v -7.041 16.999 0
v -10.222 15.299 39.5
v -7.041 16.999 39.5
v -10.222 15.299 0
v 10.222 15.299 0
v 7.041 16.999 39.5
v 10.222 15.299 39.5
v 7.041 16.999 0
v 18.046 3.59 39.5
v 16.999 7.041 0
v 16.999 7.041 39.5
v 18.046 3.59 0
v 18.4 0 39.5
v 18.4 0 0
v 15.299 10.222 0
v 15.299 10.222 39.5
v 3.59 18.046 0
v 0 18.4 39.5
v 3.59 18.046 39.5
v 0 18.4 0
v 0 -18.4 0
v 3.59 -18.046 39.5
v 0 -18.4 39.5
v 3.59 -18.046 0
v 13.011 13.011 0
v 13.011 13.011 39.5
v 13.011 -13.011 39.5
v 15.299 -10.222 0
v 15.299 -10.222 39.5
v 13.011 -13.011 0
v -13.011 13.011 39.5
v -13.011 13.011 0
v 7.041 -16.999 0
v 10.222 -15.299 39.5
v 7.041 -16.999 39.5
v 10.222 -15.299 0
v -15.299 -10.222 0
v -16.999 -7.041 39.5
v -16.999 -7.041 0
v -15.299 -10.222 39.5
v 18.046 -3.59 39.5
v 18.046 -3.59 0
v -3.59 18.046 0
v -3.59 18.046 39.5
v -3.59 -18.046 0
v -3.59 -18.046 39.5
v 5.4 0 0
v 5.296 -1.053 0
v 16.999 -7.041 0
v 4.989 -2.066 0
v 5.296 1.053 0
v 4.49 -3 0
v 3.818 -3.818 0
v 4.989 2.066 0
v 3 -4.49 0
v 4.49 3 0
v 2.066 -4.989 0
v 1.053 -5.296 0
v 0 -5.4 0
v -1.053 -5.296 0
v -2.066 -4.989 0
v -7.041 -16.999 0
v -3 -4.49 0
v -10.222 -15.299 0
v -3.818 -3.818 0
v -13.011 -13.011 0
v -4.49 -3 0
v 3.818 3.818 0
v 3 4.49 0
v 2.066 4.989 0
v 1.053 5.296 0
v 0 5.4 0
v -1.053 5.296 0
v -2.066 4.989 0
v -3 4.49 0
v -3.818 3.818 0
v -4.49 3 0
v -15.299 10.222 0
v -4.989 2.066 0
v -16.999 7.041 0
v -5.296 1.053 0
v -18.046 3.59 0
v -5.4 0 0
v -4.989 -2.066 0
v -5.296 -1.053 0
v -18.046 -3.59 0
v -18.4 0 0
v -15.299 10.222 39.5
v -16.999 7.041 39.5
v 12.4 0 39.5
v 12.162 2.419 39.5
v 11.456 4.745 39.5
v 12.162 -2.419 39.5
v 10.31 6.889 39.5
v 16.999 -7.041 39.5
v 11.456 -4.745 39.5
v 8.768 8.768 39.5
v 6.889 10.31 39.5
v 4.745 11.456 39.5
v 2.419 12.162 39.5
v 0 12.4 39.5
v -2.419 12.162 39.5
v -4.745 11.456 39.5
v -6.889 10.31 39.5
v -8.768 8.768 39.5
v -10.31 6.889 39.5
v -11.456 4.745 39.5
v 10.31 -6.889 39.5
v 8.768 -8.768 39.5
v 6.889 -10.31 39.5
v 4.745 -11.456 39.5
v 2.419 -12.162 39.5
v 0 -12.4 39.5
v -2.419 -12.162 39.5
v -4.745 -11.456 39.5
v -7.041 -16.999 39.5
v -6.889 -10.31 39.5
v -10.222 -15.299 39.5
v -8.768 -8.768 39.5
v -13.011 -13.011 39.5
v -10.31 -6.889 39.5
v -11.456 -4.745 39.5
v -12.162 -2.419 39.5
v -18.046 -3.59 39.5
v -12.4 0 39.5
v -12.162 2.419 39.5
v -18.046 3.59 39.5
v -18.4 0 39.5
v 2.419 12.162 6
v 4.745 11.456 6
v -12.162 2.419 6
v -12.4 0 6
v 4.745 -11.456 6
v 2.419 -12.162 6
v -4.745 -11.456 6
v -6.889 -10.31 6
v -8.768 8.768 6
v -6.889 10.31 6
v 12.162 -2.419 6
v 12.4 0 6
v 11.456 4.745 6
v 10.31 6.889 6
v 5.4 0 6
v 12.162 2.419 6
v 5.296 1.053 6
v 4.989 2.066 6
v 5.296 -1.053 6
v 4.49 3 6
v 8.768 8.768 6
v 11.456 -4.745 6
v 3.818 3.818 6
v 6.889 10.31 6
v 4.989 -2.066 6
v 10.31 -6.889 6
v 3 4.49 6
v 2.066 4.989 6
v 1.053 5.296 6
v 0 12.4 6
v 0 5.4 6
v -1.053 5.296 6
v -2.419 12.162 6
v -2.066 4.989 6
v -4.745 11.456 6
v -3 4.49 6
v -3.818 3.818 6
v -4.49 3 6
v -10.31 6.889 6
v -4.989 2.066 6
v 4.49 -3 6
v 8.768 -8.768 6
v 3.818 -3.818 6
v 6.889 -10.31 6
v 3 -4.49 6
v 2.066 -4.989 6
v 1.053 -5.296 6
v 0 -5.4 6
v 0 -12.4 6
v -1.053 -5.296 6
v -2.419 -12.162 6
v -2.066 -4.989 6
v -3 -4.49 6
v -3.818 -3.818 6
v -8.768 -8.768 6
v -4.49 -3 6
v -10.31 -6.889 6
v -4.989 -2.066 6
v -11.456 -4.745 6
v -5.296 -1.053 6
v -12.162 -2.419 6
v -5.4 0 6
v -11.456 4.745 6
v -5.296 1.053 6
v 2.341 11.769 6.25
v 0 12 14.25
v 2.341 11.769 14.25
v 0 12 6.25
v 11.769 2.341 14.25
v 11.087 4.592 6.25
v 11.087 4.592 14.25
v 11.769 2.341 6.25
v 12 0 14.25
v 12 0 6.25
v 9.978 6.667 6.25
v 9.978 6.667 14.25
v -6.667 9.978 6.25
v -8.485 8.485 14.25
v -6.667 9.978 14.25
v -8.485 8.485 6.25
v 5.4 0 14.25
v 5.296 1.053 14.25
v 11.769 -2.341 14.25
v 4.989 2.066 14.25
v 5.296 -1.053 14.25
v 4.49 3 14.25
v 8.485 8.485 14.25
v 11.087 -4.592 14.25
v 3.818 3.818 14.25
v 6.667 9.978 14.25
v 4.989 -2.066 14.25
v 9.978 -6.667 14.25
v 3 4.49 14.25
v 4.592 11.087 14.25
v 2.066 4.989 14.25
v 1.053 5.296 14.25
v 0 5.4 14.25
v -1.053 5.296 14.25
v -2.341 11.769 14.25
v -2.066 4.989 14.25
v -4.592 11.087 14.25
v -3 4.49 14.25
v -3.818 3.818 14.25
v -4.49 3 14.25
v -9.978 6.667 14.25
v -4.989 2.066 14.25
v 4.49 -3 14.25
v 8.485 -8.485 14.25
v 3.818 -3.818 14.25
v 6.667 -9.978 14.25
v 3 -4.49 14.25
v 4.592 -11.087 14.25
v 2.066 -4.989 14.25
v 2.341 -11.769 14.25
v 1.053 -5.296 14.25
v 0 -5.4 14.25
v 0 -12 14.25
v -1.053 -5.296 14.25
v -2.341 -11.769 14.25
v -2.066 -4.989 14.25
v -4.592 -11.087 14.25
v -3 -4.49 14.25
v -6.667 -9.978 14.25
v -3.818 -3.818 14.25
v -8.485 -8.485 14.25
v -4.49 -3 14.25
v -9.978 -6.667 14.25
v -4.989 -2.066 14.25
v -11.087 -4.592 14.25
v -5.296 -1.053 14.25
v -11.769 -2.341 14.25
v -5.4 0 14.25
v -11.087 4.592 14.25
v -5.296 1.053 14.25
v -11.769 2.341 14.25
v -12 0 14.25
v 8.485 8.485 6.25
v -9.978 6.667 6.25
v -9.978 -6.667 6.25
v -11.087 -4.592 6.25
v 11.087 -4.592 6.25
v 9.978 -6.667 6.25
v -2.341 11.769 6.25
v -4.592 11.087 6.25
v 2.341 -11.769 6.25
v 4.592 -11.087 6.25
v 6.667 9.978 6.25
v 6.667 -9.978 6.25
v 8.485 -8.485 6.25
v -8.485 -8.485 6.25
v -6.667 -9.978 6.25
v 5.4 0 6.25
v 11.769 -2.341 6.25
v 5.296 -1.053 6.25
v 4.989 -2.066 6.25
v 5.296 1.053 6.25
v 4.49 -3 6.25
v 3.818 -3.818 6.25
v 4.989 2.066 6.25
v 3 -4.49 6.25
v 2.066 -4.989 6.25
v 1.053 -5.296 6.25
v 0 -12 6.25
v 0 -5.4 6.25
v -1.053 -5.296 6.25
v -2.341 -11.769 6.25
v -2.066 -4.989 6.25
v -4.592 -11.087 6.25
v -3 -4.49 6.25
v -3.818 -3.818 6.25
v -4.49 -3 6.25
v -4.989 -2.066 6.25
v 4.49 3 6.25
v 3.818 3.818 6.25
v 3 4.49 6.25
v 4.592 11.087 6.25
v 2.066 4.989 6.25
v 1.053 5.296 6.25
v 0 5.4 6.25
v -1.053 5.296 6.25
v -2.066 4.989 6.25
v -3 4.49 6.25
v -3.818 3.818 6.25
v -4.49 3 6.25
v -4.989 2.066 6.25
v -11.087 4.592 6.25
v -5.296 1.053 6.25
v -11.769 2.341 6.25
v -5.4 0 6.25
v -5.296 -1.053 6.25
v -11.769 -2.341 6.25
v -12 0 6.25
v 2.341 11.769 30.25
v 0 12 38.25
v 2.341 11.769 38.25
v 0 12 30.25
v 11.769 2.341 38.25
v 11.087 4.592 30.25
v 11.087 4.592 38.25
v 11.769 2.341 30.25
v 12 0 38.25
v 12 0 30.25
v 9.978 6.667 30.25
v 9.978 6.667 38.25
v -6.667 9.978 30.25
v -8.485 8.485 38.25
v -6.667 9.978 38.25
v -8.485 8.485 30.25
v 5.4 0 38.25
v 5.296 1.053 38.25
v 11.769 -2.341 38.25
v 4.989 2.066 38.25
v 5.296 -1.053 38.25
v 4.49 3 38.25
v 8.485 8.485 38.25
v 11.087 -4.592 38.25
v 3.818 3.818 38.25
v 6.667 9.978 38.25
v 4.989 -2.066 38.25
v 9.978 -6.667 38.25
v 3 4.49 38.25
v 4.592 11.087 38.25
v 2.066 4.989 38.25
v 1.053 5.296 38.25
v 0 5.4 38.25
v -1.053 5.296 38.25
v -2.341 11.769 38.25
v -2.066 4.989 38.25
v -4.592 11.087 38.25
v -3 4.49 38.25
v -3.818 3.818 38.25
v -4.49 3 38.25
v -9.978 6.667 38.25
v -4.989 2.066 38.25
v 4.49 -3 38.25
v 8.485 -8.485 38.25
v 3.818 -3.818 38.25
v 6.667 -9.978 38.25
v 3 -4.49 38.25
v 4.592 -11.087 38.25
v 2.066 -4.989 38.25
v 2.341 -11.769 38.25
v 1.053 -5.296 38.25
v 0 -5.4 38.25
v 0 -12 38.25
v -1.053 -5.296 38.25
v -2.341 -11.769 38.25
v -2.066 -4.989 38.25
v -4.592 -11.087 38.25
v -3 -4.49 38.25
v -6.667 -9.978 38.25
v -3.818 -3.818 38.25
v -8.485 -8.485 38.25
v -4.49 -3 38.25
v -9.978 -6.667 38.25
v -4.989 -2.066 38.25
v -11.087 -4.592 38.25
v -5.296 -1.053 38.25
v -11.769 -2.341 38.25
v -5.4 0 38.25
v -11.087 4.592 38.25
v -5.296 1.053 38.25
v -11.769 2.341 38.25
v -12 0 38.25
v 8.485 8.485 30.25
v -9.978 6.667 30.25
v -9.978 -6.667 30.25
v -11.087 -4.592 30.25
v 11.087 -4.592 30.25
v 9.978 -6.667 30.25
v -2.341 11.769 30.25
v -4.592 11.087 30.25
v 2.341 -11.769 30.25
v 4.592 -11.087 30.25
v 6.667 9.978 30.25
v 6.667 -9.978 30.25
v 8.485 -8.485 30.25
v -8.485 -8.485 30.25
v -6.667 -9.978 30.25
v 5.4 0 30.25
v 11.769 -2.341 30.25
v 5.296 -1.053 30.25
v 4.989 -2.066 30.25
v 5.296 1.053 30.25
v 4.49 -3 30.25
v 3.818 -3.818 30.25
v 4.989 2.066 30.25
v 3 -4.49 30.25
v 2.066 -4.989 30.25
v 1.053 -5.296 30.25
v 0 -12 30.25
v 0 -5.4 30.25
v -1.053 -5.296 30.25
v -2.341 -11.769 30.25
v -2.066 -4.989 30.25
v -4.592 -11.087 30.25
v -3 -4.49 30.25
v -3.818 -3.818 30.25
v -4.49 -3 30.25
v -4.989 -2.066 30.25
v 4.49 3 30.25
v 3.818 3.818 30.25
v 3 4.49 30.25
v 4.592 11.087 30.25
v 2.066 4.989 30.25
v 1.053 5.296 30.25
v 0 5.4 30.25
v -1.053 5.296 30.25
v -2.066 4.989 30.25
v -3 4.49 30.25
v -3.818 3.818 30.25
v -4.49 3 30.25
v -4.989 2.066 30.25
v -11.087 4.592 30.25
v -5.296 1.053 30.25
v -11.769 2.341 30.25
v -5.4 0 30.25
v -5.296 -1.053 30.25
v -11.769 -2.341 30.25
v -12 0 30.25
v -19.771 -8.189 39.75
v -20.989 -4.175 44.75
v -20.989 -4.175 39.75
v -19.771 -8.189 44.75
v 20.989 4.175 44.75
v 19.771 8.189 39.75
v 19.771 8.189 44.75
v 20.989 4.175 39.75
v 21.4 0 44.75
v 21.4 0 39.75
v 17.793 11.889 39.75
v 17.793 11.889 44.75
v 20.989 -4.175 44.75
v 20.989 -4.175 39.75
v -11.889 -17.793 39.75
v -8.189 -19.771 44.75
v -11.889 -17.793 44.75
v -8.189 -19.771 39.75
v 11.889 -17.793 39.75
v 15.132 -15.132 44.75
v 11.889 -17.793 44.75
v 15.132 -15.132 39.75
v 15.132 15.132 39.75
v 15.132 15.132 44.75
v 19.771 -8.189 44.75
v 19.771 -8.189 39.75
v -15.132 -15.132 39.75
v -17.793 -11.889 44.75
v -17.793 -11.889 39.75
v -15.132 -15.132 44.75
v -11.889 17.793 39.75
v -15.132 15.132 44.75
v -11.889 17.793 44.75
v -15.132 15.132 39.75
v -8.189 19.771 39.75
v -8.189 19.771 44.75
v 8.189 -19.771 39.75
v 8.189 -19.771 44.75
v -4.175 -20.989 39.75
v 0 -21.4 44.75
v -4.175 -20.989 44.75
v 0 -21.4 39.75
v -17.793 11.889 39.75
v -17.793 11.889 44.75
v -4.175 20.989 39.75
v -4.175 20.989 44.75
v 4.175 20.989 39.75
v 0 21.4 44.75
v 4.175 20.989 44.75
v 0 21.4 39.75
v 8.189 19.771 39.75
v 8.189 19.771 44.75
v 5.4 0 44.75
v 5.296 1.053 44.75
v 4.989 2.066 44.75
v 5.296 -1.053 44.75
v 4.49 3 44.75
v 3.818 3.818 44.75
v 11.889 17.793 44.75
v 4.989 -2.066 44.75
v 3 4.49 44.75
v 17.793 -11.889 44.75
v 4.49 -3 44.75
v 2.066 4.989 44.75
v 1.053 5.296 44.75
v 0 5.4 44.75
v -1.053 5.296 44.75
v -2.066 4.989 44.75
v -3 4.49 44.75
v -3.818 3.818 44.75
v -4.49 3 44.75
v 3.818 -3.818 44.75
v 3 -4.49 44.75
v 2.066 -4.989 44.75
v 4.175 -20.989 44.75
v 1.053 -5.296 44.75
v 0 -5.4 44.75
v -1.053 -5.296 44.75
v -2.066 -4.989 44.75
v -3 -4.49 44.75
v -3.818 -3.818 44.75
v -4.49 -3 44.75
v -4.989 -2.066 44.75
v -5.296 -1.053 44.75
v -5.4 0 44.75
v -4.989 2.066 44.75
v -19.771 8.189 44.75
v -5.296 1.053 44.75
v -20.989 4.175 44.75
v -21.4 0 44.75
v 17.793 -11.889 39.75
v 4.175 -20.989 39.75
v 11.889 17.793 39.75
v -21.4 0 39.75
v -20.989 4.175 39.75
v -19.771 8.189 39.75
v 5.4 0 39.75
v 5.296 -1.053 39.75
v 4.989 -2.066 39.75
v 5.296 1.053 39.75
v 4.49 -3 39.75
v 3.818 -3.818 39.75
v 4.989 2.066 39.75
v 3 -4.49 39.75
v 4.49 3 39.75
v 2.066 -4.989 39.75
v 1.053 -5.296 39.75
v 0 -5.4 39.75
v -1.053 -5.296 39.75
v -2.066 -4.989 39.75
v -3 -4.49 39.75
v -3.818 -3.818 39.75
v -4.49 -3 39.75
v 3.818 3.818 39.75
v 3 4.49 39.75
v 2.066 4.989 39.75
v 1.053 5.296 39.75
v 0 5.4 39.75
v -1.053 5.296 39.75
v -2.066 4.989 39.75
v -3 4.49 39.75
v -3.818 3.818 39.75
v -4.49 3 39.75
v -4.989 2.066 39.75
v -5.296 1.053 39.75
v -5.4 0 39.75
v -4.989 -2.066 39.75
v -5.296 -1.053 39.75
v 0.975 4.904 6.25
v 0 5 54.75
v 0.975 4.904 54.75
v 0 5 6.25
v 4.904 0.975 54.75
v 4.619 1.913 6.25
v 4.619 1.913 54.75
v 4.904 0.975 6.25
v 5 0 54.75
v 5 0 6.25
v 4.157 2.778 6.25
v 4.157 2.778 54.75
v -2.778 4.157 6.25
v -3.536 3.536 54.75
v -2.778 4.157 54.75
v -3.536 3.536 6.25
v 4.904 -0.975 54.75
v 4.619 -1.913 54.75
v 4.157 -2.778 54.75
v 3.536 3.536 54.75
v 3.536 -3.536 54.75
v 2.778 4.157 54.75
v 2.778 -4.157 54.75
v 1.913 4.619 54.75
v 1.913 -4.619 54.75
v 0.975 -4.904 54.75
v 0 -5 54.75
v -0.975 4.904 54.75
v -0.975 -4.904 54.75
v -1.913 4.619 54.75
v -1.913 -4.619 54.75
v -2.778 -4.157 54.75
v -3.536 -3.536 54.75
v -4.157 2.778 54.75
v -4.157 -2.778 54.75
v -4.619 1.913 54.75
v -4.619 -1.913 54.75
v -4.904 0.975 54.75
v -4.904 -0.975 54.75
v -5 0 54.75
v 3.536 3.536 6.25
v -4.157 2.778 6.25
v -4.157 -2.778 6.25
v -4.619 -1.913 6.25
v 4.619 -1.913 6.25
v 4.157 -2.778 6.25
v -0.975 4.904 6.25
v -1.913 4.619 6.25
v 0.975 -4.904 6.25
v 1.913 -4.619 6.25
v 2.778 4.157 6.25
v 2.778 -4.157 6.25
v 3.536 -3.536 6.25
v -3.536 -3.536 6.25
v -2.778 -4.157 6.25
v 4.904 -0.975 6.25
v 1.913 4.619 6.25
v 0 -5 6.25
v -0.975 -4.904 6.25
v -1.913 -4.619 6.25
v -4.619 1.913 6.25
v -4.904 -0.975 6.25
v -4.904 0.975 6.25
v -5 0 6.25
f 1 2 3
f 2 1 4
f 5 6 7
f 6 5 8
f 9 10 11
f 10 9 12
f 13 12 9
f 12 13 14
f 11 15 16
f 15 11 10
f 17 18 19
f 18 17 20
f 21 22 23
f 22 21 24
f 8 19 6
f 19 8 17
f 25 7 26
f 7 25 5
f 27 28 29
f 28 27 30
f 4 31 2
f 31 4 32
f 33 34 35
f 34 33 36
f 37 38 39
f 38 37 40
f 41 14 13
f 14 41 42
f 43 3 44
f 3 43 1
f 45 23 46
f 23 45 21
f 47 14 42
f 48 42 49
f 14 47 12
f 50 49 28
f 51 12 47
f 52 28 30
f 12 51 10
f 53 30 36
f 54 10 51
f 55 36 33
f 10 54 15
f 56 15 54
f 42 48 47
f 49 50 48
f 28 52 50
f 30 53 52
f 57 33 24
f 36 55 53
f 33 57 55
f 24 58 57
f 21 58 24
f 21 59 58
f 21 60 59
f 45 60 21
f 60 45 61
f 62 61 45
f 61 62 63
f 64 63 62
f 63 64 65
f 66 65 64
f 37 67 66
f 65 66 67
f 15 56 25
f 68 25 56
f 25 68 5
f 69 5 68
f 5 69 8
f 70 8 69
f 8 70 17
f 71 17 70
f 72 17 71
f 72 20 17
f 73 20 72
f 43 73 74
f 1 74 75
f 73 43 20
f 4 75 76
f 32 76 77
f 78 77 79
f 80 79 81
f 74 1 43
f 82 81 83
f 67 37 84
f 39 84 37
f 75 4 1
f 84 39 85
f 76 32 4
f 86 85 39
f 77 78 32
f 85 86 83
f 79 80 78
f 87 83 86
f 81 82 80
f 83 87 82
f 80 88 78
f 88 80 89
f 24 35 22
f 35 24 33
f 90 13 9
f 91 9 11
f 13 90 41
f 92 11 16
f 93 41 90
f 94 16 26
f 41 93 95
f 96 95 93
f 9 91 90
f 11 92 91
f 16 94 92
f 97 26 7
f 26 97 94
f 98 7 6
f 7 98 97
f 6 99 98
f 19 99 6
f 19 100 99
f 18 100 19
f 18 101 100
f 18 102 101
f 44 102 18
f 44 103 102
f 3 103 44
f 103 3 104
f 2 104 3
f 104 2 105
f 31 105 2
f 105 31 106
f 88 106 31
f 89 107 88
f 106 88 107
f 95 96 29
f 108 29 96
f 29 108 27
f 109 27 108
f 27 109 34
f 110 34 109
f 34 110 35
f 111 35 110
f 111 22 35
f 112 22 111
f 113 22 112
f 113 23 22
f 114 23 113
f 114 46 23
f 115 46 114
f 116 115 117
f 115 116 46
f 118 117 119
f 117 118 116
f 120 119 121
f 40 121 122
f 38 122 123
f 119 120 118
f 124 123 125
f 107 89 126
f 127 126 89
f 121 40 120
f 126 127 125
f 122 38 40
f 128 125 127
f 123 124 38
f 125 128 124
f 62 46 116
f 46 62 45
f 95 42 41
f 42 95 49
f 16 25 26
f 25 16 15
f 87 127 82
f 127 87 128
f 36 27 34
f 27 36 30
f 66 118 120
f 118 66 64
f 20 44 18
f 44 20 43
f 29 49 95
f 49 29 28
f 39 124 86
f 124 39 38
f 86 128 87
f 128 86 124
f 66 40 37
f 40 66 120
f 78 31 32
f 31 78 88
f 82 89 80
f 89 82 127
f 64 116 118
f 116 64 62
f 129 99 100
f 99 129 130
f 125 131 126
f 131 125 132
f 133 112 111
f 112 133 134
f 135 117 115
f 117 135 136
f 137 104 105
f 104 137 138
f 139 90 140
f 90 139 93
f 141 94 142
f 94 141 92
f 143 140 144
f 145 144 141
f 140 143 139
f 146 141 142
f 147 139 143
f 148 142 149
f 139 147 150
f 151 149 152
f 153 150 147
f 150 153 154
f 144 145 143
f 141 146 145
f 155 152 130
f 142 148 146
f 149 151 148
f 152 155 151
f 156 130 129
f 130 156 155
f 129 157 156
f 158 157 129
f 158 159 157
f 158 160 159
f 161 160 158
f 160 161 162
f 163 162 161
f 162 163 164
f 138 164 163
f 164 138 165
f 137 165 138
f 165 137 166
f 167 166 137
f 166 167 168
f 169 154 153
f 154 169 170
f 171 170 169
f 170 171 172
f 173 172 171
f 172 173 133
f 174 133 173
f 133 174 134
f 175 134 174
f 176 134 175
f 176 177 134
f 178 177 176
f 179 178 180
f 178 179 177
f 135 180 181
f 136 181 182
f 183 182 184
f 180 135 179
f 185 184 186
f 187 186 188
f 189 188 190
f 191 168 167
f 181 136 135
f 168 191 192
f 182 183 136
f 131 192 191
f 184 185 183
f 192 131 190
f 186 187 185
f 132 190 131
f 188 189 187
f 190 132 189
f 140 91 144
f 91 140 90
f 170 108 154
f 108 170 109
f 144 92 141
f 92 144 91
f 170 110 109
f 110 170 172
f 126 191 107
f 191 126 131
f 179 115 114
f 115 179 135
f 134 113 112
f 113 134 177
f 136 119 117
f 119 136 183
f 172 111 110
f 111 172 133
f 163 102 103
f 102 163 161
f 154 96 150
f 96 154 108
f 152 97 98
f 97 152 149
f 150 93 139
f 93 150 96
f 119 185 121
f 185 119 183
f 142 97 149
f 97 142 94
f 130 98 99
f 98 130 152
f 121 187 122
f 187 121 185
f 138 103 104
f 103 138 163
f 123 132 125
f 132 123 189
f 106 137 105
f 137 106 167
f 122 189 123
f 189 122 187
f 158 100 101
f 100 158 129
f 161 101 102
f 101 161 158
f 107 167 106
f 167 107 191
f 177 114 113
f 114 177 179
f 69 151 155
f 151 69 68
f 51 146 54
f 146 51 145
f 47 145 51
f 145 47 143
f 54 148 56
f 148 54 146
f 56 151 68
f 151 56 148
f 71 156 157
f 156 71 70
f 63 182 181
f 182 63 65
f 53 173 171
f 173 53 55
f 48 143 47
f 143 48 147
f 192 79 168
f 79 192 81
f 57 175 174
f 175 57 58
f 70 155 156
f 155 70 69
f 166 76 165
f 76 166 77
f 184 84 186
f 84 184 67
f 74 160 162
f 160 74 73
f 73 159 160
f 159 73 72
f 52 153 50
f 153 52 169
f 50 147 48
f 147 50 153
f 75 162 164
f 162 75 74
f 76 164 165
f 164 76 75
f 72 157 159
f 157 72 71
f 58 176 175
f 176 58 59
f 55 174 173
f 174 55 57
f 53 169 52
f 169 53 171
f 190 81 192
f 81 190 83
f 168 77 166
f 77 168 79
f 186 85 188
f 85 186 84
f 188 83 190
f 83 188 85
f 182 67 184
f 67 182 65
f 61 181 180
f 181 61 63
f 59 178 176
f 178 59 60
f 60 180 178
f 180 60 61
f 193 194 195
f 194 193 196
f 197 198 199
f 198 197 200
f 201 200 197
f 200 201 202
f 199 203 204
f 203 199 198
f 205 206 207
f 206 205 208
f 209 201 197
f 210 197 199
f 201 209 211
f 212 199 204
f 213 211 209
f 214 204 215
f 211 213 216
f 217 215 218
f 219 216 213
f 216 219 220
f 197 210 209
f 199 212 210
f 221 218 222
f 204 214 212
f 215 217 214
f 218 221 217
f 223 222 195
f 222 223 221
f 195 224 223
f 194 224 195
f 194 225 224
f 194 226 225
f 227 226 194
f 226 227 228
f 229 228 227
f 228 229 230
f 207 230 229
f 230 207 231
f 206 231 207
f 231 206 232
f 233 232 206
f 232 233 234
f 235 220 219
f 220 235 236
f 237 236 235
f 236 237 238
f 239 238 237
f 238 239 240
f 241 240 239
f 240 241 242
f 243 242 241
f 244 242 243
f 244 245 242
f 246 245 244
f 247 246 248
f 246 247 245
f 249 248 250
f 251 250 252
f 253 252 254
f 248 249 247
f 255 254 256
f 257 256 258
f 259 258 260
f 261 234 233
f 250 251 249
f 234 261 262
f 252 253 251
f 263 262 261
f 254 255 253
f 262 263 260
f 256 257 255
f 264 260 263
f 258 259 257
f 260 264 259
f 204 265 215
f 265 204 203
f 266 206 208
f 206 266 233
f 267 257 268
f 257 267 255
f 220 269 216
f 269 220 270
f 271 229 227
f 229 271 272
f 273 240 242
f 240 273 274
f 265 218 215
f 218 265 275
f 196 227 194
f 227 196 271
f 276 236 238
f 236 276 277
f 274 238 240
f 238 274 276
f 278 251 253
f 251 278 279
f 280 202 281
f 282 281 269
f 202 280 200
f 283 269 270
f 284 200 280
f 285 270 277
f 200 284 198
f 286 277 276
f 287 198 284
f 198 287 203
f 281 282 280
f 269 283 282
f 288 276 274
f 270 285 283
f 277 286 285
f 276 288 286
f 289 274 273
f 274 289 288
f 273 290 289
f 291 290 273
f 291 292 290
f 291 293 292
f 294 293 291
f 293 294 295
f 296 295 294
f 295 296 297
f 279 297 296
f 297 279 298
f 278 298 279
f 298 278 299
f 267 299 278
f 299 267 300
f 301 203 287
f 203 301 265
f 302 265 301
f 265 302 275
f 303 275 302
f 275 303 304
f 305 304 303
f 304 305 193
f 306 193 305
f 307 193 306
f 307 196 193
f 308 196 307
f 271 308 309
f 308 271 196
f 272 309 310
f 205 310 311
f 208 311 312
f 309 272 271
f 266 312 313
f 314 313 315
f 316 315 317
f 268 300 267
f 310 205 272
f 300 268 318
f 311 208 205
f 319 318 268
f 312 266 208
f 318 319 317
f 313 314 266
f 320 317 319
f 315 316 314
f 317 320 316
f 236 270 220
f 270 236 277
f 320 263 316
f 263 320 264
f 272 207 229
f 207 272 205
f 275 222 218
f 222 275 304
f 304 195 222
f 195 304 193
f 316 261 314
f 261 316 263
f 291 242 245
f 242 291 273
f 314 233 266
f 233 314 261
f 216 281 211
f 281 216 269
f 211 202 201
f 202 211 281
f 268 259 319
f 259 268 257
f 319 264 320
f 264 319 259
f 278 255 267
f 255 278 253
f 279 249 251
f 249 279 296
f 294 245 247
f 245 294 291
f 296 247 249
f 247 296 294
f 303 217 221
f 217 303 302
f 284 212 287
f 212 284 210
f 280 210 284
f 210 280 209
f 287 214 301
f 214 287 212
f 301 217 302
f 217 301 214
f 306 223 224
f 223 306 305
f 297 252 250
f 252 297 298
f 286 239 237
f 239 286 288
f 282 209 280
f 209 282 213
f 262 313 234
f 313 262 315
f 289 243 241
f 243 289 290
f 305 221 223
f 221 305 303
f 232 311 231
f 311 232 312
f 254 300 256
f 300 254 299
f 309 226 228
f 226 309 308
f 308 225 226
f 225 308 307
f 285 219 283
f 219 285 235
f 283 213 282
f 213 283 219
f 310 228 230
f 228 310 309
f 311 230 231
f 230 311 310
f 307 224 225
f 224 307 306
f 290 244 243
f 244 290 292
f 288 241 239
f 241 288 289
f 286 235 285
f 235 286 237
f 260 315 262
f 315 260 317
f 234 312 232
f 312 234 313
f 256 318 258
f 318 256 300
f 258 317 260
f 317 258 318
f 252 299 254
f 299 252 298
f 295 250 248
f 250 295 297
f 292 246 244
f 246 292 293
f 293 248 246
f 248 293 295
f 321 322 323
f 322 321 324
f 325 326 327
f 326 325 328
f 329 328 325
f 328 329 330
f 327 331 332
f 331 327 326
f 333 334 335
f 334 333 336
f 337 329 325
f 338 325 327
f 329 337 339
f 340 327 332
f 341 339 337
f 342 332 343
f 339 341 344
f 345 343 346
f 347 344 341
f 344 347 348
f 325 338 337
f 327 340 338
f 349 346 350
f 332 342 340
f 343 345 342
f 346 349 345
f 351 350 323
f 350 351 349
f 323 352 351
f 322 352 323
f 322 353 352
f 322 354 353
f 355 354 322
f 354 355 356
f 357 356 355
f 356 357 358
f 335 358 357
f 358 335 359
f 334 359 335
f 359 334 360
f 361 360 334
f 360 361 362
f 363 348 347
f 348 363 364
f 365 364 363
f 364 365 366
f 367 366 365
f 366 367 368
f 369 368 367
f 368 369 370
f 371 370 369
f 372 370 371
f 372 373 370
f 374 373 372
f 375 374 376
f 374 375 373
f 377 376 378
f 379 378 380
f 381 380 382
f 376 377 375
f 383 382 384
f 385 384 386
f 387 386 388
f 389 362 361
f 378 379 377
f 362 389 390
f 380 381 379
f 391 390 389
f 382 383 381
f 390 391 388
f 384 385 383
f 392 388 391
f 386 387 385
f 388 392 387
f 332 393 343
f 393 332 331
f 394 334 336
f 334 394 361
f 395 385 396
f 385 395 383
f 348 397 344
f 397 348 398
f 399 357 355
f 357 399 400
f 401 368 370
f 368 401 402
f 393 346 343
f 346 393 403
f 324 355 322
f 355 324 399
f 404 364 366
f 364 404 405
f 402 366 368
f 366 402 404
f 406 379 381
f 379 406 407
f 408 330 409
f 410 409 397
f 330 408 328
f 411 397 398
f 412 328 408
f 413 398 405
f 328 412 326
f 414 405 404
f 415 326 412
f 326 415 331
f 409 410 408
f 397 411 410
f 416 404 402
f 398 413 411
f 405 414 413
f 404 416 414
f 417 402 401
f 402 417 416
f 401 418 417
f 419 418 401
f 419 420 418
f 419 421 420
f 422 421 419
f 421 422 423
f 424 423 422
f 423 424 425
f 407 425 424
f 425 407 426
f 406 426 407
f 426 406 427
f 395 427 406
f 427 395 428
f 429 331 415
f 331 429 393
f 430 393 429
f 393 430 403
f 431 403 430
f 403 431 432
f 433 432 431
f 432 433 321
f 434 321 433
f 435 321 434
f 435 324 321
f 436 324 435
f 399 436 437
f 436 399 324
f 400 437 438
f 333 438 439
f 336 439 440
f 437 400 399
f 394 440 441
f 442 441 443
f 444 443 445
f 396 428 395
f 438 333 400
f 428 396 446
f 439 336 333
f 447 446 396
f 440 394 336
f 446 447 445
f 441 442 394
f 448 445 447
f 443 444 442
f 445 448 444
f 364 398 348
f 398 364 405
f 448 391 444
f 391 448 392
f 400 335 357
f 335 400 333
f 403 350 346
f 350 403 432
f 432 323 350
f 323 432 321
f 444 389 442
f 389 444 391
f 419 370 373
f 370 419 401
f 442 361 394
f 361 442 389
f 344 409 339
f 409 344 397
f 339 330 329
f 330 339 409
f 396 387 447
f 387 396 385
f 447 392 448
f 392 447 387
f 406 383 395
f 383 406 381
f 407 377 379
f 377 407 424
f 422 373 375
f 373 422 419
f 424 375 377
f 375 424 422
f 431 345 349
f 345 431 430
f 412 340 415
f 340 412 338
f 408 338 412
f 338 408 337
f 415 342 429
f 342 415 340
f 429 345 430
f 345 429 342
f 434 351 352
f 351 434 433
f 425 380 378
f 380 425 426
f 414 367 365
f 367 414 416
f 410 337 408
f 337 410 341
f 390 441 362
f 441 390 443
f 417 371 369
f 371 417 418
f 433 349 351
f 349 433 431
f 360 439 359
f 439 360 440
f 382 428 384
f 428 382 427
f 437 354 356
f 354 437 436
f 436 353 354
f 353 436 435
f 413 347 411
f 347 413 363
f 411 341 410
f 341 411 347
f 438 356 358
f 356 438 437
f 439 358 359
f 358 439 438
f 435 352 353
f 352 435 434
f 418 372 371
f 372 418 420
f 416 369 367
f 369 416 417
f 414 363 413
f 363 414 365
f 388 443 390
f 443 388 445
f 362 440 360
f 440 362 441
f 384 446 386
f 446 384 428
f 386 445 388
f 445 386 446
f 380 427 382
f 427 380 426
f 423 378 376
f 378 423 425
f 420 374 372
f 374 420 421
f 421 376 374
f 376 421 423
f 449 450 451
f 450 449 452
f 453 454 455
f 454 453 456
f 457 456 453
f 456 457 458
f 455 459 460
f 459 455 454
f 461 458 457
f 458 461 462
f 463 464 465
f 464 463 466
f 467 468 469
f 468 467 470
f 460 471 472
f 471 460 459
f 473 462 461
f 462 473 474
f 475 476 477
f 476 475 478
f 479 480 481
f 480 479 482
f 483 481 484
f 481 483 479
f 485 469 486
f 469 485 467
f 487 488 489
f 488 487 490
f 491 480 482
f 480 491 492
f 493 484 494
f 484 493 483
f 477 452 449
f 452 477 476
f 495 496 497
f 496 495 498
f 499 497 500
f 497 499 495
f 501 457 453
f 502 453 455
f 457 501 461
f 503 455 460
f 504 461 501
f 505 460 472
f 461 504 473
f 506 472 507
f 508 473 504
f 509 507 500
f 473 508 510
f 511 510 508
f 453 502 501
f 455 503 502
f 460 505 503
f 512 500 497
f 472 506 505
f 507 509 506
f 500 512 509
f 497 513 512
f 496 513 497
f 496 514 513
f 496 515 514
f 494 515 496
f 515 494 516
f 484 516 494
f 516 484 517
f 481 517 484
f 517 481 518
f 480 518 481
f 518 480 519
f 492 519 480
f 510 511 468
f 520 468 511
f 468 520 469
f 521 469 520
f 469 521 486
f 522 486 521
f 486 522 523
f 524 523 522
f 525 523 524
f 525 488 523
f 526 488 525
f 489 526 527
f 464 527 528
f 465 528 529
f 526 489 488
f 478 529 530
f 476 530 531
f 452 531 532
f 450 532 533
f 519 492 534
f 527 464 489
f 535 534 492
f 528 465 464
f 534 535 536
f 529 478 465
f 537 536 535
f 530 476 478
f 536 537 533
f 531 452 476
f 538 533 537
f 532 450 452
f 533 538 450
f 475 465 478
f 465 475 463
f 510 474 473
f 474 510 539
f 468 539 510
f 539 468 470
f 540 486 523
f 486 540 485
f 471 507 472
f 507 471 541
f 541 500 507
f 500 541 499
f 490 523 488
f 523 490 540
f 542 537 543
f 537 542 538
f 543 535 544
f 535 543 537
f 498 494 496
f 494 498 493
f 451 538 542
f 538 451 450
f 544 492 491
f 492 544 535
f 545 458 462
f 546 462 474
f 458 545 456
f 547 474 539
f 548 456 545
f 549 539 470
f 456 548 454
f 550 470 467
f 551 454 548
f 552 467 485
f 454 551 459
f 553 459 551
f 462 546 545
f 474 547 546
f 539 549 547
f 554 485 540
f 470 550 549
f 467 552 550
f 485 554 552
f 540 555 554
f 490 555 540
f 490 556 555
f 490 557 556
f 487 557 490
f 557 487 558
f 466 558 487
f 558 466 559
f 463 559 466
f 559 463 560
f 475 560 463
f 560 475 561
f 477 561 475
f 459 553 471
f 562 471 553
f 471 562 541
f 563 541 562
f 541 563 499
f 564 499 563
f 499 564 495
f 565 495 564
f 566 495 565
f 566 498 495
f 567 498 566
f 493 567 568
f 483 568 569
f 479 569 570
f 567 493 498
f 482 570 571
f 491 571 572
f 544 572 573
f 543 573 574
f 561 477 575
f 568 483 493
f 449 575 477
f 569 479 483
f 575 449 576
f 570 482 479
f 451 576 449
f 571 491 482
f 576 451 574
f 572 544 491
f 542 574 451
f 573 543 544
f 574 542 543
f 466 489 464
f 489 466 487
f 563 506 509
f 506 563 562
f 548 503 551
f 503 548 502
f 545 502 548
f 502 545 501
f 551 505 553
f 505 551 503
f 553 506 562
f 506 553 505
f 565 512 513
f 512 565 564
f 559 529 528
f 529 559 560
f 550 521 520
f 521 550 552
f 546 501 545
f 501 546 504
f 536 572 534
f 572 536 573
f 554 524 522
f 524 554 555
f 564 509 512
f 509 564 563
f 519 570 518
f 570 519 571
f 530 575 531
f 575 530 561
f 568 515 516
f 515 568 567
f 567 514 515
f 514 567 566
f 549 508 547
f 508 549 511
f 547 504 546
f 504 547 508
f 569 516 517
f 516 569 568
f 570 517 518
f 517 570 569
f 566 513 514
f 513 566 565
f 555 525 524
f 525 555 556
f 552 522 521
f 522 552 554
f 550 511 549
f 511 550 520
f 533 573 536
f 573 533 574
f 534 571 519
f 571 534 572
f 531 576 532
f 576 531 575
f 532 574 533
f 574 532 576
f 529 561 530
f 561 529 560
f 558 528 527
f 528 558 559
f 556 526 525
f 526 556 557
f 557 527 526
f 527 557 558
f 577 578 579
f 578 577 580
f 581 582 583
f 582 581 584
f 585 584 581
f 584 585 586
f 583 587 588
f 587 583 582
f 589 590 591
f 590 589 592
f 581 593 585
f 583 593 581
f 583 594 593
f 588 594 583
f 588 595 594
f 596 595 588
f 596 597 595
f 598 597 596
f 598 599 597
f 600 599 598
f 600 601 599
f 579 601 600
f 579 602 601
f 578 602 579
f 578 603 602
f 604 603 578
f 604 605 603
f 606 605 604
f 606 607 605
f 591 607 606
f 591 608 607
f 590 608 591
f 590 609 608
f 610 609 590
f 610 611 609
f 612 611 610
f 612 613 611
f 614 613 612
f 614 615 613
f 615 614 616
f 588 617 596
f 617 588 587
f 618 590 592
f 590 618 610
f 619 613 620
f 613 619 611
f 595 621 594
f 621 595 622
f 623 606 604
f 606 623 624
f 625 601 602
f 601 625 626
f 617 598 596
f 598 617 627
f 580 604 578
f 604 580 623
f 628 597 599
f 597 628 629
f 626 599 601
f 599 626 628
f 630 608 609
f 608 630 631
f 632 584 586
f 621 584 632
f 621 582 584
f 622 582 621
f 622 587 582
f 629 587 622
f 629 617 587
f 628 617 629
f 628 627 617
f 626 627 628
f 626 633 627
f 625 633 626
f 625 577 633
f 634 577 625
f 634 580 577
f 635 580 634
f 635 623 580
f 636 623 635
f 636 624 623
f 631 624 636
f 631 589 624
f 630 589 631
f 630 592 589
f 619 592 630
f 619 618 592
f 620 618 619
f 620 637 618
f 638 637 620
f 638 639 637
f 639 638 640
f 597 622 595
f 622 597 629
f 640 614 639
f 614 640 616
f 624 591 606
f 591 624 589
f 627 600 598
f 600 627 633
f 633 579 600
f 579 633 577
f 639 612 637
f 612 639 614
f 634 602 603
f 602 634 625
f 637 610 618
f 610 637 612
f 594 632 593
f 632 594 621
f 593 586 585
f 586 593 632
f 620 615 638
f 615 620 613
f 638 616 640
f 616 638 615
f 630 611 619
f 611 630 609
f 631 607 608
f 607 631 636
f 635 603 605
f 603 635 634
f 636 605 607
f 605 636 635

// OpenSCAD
$fn = 32;

// ------------------------------------------------------------------------
// Shaft station: cup d36.8 x 39.5 mm, shaft d10
// Every part is its own module, assembly() places every instance.
// ------------------------------------------------------------------------

// --- part 1 ---
module housing_cup() {
  difference() {
    cylinder(h = 39.5, d = 36.8);
    translate([0, 0, 6]) cylinder(h = 34.5, d = 24.8);
    translate([0, 0, -1]) cylinder(h = 8, d = 10.8);
  }
}

// --- part 2 ---
module bearing_lower() {
  difference() {
      translate([0, 0, 0]) cylinder(h = 8, d = 24);
      translate([0, 0, -1]) cylinder(h = 10, d = 10.8);
    }
}

// --- part 3 ---
module bearing_upper() {
  difference() {
      translate([0, 0, 0]) cylinder(h = 8, d = 24);
      translate([0, 0, -1]) cylinder(h = 10, d = 10.8);
    }
}

// --- part 4 ---
module station_shaft() {
  translate([0, 0, -24.25]) cylinder(h = 48.5, d = 10);
}

// --- part 5 ---
module station_cover() {
  difference() {
    cylinder(h = 5, d = 42.8);
    translate([0, 0, -1]) cylinder(h = 7, d = 10.8);
  }
}

// --- assembly ---
module assembly() {
  color([0.80, 0.24, 0.20]) translate([0, 0, 0]) rotate([0, 0, 0]) housing_cup();
  color([0.20, 0.45, 0.75]) translate([0, 0, 6.25]) rotate([0, 0, 0]) bearing_lower();
  color([0.25, 0.62, 0.32]) translate([0, 0, 30.25]) rotate([0, 0, 0]) bearing_upper();
  color([0.92, 0.70, 0.18]) translate([0, 0, 30.5]) rotate([0, 0, 0]) station_shaft();
  color([0.58, 0.35, 0.70]) translate([0, 0, 39.75]) rotate([0, 0, 0]) station_cover();
}

assembly();
